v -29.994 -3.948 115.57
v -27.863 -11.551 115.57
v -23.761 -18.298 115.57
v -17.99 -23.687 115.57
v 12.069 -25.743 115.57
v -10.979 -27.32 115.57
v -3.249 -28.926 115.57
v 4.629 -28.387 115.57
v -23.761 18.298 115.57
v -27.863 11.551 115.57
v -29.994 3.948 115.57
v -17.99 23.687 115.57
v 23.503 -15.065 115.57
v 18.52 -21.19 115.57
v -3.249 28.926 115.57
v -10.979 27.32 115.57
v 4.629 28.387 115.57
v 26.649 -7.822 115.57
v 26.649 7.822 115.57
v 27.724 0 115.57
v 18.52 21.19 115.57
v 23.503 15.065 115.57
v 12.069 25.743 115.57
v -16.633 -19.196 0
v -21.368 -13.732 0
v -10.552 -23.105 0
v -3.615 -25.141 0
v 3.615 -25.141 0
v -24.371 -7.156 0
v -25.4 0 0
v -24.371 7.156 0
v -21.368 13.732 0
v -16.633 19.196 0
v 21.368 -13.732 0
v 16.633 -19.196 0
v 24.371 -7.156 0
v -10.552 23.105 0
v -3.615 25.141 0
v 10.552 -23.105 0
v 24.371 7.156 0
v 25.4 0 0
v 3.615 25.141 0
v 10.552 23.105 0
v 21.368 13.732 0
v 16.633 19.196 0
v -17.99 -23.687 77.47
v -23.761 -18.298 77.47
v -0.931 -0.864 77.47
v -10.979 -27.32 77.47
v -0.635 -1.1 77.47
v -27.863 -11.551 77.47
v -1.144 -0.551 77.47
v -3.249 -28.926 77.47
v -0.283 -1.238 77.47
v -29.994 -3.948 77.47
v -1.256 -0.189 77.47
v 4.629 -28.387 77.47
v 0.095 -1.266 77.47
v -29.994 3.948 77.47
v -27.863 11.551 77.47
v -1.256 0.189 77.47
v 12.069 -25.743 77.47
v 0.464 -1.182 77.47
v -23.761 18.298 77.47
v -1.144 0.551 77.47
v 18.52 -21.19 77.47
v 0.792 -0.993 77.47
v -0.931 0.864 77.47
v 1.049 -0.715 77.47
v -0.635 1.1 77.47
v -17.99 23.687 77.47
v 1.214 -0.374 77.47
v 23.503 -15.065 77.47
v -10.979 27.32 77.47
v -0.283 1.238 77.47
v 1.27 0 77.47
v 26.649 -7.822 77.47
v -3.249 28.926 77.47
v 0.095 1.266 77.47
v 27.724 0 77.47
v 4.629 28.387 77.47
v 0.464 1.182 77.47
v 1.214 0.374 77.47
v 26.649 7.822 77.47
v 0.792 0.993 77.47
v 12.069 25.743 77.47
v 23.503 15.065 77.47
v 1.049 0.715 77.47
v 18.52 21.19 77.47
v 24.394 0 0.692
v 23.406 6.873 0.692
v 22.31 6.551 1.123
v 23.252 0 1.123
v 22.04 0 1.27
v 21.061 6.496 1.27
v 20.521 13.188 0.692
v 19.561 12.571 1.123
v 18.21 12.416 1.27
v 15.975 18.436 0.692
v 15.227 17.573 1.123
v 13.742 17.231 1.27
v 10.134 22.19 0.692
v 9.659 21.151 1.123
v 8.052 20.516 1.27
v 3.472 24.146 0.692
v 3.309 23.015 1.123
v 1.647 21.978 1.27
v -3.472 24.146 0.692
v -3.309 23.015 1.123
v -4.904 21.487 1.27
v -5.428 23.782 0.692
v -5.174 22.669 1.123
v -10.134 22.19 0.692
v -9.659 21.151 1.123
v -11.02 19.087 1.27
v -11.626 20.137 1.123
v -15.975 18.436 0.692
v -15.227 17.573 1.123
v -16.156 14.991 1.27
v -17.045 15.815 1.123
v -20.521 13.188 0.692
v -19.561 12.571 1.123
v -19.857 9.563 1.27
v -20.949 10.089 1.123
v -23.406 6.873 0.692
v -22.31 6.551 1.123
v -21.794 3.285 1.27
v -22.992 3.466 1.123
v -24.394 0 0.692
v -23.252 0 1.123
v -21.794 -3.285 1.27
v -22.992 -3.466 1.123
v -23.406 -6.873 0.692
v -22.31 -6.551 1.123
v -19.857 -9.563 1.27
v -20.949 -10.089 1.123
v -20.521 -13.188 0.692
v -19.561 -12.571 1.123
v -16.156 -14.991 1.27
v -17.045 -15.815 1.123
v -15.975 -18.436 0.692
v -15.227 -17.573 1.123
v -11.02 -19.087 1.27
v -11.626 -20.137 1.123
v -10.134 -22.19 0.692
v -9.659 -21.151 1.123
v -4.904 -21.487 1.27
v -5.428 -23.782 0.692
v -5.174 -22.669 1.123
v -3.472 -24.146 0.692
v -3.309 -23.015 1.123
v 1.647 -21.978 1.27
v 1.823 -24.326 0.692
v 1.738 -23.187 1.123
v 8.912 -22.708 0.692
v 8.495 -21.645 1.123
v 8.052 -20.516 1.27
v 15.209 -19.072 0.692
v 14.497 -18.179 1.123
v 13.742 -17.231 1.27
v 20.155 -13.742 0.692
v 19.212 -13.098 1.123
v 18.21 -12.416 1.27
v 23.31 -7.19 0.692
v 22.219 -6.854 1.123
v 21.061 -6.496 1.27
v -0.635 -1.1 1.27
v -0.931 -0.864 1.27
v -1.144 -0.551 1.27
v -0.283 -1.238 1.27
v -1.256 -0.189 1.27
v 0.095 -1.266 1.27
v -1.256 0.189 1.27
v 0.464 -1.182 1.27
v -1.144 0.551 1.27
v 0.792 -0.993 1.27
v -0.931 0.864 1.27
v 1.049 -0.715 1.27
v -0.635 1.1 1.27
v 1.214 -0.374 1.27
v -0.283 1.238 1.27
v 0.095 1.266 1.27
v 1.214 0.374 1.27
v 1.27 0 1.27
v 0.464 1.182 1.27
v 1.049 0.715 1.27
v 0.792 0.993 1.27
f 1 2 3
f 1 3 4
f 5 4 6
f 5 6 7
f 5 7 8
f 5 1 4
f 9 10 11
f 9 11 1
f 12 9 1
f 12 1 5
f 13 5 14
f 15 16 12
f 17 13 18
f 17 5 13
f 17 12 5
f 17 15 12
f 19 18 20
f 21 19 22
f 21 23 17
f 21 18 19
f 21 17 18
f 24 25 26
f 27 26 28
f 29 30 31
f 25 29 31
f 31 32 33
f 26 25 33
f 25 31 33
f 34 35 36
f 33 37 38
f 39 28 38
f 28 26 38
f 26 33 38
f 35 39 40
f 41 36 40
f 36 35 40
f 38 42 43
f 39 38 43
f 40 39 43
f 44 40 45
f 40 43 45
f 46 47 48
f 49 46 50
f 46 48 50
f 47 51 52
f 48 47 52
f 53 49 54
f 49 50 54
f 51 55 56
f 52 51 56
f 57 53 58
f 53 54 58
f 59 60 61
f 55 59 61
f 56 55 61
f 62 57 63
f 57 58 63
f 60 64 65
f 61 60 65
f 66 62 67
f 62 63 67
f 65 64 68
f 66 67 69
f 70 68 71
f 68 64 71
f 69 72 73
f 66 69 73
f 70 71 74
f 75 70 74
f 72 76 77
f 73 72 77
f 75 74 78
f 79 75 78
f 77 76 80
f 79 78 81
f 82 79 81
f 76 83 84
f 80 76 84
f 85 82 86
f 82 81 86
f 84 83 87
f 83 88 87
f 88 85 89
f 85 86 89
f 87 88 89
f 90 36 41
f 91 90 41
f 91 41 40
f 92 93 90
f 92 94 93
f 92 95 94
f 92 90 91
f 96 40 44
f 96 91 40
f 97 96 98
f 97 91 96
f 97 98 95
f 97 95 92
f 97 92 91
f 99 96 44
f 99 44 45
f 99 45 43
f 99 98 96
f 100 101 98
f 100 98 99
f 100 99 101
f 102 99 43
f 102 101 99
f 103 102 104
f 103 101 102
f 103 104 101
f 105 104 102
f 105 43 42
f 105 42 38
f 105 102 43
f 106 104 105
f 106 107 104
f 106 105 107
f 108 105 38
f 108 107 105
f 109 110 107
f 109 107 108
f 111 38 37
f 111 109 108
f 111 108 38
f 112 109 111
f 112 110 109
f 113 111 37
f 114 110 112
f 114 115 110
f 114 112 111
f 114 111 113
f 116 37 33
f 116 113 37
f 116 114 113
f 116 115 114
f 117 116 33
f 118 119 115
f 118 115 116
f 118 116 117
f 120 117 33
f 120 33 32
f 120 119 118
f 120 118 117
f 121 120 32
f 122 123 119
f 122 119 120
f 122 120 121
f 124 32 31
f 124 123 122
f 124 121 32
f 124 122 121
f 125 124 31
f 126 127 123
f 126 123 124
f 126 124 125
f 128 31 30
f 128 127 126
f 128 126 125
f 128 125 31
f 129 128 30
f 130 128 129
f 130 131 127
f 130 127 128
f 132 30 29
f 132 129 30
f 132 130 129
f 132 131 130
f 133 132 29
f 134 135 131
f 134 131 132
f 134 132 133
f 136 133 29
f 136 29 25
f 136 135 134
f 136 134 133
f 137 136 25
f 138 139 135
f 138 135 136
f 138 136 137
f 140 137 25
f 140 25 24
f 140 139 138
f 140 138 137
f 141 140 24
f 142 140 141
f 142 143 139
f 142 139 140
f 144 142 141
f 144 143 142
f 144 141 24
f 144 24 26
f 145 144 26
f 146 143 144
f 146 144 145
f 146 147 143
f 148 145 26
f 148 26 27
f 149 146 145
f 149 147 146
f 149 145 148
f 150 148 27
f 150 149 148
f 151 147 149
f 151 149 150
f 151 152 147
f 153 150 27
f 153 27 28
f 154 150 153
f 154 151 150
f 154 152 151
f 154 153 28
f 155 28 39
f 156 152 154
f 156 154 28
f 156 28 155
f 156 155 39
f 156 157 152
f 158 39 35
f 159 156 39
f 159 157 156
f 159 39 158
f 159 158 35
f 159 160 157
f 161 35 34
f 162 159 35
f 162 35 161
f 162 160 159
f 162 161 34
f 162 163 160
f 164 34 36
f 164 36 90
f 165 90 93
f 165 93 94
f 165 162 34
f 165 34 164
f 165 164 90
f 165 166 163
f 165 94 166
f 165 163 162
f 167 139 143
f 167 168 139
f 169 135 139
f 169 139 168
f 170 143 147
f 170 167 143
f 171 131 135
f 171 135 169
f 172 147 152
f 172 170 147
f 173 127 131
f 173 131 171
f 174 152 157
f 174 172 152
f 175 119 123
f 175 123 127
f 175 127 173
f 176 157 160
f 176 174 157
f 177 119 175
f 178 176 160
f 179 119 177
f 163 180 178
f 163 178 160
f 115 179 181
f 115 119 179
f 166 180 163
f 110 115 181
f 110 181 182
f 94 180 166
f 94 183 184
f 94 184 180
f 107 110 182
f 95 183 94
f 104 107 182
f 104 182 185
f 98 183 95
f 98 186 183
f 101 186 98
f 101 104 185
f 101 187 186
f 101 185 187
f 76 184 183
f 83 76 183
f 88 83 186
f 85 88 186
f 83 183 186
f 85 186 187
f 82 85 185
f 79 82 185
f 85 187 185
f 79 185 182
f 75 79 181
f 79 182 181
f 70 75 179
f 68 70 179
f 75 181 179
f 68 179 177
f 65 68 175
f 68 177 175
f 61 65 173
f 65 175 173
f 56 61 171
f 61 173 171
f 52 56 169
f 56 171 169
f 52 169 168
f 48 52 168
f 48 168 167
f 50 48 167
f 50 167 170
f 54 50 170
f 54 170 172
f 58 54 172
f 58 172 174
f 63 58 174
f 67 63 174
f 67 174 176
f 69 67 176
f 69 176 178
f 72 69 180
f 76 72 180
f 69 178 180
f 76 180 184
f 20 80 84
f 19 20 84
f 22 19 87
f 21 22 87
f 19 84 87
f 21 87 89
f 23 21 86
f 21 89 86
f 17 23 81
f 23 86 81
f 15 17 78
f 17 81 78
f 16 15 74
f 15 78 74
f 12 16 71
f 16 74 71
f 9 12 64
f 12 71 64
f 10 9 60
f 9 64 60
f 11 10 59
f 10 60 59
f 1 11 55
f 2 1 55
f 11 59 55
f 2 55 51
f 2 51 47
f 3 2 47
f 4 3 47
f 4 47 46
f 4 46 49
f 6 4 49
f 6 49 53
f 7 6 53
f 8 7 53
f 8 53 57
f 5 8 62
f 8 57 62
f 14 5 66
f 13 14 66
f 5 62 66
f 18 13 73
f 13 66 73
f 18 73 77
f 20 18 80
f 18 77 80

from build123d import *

# Parameters (mm, degrees)
F0_R     = 25.4
F1_DEPTH = 1.27
F3_R     = 1.27
F4_DEPTH = 76.2
F5_R     = 28.9937476924
F6_DEPTH = 38.1


# Not quite as in the source:
# - a fillet or chamfer that OpenCascade refuses, or shapes differently, is made with other operations: its cross-section is extruded or revolved along the edge and cut away or added


with BuildPart() as f1:
    # F0 (on Top) → F1 (new body)
    with BuildSketch(Plane.XY):
        Circle(F0_R)
    extrude(amount=F1_DEPTH)

    # F2: fillet of radius 5.08 on 1 edges, made by hand

    # F2_s1 → F2_t2 (revolve, cut)
    with BuildSketch(Plane.XZ):
        with BuildLine():
            ThreePointArc((25.4, 0), (23.8359470592, 0.9419048812), (22.0398958349, 1.27))
            Line((22.0398958349, 1.27), (25.4, 1.27))
            Line((25.4, 1.27), (25.4, 0))
        make_face()
    revolve(axis=Axis((0, 0, 1.27), (0, 0, 1)), mode=Mode.SUBTRACT)

    # F3 (on face) → F4 (join)
    with BuildSketch(Plane.XY.offset(1.27)):
        Circle(F3_R)
    extrude(amount=F4_DEPTH)

    # F5 (on face) → F6 (join)
    with BuildSketch(Plane.XY.offset(77.47)):
        with Locations((-1.27, 0)):
            Circle(F5_R)
    extrude(amount=F6_DEPTH)


solid = f1.part
